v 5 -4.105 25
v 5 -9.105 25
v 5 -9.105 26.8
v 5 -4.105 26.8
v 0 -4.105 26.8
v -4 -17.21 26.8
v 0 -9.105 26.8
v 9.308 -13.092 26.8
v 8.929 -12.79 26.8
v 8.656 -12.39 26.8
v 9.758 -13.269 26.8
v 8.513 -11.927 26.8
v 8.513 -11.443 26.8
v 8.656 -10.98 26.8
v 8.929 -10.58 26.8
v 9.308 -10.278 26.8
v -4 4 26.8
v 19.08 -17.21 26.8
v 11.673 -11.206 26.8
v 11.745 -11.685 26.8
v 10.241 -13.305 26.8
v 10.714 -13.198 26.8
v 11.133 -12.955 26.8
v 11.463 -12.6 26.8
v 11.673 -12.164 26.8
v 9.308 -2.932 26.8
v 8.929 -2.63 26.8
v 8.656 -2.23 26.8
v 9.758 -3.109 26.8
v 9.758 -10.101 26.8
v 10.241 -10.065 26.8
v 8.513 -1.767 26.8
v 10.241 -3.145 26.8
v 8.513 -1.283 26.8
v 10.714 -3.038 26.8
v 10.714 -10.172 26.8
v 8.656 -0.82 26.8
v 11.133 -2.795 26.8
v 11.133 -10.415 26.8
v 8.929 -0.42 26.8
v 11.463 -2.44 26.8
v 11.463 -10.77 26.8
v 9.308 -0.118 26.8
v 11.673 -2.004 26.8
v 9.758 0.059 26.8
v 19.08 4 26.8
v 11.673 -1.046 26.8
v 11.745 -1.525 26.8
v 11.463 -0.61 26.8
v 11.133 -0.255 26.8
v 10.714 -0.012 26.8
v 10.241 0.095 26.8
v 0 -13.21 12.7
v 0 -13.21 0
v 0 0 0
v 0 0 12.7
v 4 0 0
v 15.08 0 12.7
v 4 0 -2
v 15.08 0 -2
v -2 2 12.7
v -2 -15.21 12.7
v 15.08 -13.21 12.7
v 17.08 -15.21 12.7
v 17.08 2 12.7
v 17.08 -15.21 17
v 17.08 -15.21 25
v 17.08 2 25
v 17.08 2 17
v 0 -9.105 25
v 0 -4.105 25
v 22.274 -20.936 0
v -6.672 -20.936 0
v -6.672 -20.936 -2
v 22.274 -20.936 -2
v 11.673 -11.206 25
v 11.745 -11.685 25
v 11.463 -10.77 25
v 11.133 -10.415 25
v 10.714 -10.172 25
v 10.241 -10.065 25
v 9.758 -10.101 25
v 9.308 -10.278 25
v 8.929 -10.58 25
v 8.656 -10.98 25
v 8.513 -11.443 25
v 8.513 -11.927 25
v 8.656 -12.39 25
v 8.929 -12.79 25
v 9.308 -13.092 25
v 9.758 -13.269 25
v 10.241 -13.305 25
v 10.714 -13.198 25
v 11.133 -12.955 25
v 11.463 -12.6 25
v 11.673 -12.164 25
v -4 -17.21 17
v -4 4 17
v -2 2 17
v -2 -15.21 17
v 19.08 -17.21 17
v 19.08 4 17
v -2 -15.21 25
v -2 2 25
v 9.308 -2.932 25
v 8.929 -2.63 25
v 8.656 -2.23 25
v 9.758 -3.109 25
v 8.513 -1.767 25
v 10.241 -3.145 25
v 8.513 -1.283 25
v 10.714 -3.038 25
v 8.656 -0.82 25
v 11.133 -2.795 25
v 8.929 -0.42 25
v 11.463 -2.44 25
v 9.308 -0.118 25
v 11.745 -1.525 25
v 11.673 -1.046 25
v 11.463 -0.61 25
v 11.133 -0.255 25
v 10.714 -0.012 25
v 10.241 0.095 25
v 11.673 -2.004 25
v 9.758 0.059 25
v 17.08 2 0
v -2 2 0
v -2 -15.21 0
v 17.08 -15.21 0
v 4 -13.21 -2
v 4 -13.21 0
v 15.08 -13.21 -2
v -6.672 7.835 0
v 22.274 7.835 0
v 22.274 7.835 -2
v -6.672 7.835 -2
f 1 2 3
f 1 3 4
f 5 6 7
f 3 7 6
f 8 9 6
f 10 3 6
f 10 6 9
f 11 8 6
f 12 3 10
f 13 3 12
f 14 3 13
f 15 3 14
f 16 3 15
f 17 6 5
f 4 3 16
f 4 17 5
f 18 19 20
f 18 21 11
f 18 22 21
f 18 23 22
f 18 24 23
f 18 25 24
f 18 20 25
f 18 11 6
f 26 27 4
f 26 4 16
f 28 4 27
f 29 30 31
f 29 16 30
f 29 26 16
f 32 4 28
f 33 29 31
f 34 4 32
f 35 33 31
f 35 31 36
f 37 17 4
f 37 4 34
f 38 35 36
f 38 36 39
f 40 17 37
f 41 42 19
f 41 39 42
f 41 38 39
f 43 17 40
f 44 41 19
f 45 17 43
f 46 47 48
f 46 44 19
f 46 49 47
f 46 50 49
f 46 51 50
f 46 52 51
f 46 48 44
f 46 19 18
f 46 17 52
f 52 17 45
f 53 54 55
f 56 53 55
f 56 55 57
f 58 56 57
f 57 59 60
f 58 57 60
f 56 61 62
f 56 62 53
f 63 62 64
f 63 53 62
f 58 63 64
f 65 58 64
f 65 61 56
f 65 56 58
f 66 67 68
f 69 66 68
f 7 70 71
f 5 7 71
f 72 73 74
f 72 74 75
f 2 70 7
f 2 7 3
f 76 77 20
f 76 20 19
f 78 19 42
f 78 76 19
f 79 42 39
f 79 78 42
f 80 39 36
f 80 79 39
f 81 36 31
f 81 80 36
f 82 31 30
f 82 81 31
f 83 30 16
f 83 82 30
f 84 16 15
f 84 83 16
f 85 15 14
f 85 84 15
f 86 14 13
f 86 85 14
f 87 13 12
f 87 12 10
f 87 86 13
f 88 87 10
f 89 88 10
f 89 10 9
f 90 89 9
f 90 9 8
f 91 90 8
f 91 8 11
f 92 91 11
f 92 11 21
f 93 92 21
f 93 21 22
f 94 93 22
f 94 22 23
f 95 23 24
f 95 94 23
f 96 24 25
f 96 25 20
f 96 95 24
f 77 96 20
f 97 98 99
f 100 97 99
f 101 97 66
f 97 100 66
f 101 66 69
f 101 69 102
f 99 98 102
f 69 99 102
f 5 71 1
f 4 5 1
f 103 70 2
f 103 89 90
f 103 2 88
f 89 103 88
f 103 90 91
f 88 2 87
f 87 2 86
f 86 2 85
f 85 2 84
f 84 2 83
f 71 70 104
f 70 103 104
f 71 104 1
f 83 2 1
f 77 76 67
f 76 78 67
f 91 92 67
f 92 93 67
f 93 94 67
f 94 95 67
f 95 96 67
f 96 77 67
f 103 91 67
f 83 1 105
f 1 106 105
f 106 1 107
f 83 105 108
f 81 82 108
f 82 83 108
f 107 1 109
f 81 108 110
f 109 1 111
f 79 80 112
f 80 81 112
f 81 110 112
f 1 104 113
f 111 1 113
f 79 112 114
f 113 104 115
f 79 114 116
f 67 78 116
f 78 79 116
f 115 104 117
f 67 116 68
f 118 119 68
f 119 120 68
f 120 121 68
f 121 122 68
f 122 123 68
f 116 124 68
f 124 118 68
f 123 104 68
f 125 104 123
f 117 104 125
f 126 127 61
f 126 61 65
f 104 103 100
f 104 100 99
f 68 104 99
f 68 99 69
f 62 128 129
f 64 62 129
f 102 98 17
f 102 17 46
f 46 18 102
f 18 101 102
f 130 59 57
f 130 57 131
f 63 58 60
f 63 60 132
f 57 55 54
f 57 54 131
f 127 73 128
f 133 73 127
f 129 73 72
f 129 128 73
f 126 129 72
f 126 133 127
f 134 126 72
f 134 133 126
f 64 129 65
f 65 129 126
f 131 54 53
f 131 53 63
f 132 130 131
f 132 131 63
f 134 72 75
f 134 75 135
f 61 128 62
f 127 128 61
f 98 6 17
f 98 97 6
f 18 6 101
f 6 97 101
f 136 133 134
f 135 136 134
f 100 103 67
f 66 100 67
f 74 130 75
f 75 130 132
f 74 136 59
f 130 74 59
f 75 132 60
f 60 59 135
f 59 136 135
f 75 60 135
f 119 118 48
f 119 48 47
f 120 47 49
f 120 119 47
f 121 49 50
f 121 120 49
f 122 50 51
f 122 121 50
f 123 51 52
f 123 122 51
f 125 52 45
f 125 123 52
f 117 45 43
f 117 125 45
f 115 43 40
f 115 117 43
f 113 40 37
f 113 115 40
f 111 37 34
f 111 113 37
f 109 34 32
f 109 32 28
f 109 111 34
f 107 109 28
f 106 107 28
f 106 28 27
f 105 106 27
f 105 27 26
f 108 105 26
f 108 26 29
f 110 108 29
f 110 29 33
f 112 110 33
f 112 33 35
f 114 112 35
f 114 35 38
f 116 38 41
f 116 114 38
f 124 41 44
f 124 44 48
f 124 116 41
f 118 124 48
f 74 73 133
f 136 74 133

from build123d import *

# Parameters (mm, degrees)
F0_W      = 19.08
F0_H      = 17.21
F0_W_2    = 15.08
F0_H_2    = 13.21
F1_DEPTH  = 12.7
F3_W      = 23.08
F3_H      = 21.21
F3_W_2    = 19.08
F3_H_2    = 17.21
F4_DEPTH  = 8
F5_DEPTH  = 1.8
F6_W      = 5
F6_H      = 5
F6_R      = 1.625
F7_DEPTH  = 1.8
F8_W      = 28.9459526539
F8_H      = 28.7711434066
F9_DEPTH  = 2
F11_W     = 11.08
F11_H     = 13.21
F12_DEPTH = 2


with BuildPart() as f1:
    # F0 (on Top) → F1 (new body)
    with BuildSketch(Plane.XY):
        with Locations((7.54, -6.605)):
            Rectangle(F0_W, F0_H)
        with Locations((7.54, -6.605)):
            Rectangle(F0_W_2, F0_H_2, mode=Mode.SUBTRACT)
    extrude(amount=F1_DEPTH)

    # F8 (on Top) → F9 (join)
    with BuildSketch(Plane.XY):
        with Locations((7.8014414757, -6.5501015633)):
            Rectangle(F8_W, F8_H)
    extrude(amount=-F9_DEPTH)

    # F11 (on face) → F12 (cut, through all)
    with BuildSketch(Plane(origin=(0, 0, -2), x_dir=(1, 0, 0), z_dir=(0, 0, -1))):
        with Locations((9.54, 6.605)):
            Rectangle(F11_W, F11_H)
    extrude(amount=-F12_DEPTH, mode=Mode.SUBTRACT)


with BuildPart() as f4:
    # F3 (on offset) → F4 (new body)
    with BuildSketch(Plane.XY.offset(25)):
        with Locations((7.54, -6.605)):
            Rectangle(F3_W, F3_H)
        with Locations((7.54, -6.605)):
            Rectangle(F3_W_2, F3_H_2, mode=Mode.SUBTRACT)
    extrude(amount=-F4_DEPTH)

    # F3 (on offset) → F5 (join)
    with BuildSketch(Plane.XY.offset(25)):
        with Locations((7.54, -6.605)):
            Rectangle(F3_W, F3_H)
        with Locations((7.54, -6.605)):
            Rectangle(F3_W_2, F3_H_2, mode=Mode.SUBTRACT)
        with Locations((7.54, -6.605)):
            Rectangle(F3_W_2, F3_H_2)
    extrude(amount=F5_DEPTH)

    # F6 (on face) → F7 (cut, through all)
    with BuildSketch(Plane.XY.offset(25)):
        with Locations((2.5, -6.605)):
            Rectangle(F6_W, F6_H)
        with Locations((10.12, -11.685)):
            Circle(F6_R)
        with Locations((10.12, -1.525)):
            Circle(F6_R)
    extrude(amount=F7_DEPTH, mode=Mode.SUBTRACT)


solid = Compound([f1.part, f4.part])
